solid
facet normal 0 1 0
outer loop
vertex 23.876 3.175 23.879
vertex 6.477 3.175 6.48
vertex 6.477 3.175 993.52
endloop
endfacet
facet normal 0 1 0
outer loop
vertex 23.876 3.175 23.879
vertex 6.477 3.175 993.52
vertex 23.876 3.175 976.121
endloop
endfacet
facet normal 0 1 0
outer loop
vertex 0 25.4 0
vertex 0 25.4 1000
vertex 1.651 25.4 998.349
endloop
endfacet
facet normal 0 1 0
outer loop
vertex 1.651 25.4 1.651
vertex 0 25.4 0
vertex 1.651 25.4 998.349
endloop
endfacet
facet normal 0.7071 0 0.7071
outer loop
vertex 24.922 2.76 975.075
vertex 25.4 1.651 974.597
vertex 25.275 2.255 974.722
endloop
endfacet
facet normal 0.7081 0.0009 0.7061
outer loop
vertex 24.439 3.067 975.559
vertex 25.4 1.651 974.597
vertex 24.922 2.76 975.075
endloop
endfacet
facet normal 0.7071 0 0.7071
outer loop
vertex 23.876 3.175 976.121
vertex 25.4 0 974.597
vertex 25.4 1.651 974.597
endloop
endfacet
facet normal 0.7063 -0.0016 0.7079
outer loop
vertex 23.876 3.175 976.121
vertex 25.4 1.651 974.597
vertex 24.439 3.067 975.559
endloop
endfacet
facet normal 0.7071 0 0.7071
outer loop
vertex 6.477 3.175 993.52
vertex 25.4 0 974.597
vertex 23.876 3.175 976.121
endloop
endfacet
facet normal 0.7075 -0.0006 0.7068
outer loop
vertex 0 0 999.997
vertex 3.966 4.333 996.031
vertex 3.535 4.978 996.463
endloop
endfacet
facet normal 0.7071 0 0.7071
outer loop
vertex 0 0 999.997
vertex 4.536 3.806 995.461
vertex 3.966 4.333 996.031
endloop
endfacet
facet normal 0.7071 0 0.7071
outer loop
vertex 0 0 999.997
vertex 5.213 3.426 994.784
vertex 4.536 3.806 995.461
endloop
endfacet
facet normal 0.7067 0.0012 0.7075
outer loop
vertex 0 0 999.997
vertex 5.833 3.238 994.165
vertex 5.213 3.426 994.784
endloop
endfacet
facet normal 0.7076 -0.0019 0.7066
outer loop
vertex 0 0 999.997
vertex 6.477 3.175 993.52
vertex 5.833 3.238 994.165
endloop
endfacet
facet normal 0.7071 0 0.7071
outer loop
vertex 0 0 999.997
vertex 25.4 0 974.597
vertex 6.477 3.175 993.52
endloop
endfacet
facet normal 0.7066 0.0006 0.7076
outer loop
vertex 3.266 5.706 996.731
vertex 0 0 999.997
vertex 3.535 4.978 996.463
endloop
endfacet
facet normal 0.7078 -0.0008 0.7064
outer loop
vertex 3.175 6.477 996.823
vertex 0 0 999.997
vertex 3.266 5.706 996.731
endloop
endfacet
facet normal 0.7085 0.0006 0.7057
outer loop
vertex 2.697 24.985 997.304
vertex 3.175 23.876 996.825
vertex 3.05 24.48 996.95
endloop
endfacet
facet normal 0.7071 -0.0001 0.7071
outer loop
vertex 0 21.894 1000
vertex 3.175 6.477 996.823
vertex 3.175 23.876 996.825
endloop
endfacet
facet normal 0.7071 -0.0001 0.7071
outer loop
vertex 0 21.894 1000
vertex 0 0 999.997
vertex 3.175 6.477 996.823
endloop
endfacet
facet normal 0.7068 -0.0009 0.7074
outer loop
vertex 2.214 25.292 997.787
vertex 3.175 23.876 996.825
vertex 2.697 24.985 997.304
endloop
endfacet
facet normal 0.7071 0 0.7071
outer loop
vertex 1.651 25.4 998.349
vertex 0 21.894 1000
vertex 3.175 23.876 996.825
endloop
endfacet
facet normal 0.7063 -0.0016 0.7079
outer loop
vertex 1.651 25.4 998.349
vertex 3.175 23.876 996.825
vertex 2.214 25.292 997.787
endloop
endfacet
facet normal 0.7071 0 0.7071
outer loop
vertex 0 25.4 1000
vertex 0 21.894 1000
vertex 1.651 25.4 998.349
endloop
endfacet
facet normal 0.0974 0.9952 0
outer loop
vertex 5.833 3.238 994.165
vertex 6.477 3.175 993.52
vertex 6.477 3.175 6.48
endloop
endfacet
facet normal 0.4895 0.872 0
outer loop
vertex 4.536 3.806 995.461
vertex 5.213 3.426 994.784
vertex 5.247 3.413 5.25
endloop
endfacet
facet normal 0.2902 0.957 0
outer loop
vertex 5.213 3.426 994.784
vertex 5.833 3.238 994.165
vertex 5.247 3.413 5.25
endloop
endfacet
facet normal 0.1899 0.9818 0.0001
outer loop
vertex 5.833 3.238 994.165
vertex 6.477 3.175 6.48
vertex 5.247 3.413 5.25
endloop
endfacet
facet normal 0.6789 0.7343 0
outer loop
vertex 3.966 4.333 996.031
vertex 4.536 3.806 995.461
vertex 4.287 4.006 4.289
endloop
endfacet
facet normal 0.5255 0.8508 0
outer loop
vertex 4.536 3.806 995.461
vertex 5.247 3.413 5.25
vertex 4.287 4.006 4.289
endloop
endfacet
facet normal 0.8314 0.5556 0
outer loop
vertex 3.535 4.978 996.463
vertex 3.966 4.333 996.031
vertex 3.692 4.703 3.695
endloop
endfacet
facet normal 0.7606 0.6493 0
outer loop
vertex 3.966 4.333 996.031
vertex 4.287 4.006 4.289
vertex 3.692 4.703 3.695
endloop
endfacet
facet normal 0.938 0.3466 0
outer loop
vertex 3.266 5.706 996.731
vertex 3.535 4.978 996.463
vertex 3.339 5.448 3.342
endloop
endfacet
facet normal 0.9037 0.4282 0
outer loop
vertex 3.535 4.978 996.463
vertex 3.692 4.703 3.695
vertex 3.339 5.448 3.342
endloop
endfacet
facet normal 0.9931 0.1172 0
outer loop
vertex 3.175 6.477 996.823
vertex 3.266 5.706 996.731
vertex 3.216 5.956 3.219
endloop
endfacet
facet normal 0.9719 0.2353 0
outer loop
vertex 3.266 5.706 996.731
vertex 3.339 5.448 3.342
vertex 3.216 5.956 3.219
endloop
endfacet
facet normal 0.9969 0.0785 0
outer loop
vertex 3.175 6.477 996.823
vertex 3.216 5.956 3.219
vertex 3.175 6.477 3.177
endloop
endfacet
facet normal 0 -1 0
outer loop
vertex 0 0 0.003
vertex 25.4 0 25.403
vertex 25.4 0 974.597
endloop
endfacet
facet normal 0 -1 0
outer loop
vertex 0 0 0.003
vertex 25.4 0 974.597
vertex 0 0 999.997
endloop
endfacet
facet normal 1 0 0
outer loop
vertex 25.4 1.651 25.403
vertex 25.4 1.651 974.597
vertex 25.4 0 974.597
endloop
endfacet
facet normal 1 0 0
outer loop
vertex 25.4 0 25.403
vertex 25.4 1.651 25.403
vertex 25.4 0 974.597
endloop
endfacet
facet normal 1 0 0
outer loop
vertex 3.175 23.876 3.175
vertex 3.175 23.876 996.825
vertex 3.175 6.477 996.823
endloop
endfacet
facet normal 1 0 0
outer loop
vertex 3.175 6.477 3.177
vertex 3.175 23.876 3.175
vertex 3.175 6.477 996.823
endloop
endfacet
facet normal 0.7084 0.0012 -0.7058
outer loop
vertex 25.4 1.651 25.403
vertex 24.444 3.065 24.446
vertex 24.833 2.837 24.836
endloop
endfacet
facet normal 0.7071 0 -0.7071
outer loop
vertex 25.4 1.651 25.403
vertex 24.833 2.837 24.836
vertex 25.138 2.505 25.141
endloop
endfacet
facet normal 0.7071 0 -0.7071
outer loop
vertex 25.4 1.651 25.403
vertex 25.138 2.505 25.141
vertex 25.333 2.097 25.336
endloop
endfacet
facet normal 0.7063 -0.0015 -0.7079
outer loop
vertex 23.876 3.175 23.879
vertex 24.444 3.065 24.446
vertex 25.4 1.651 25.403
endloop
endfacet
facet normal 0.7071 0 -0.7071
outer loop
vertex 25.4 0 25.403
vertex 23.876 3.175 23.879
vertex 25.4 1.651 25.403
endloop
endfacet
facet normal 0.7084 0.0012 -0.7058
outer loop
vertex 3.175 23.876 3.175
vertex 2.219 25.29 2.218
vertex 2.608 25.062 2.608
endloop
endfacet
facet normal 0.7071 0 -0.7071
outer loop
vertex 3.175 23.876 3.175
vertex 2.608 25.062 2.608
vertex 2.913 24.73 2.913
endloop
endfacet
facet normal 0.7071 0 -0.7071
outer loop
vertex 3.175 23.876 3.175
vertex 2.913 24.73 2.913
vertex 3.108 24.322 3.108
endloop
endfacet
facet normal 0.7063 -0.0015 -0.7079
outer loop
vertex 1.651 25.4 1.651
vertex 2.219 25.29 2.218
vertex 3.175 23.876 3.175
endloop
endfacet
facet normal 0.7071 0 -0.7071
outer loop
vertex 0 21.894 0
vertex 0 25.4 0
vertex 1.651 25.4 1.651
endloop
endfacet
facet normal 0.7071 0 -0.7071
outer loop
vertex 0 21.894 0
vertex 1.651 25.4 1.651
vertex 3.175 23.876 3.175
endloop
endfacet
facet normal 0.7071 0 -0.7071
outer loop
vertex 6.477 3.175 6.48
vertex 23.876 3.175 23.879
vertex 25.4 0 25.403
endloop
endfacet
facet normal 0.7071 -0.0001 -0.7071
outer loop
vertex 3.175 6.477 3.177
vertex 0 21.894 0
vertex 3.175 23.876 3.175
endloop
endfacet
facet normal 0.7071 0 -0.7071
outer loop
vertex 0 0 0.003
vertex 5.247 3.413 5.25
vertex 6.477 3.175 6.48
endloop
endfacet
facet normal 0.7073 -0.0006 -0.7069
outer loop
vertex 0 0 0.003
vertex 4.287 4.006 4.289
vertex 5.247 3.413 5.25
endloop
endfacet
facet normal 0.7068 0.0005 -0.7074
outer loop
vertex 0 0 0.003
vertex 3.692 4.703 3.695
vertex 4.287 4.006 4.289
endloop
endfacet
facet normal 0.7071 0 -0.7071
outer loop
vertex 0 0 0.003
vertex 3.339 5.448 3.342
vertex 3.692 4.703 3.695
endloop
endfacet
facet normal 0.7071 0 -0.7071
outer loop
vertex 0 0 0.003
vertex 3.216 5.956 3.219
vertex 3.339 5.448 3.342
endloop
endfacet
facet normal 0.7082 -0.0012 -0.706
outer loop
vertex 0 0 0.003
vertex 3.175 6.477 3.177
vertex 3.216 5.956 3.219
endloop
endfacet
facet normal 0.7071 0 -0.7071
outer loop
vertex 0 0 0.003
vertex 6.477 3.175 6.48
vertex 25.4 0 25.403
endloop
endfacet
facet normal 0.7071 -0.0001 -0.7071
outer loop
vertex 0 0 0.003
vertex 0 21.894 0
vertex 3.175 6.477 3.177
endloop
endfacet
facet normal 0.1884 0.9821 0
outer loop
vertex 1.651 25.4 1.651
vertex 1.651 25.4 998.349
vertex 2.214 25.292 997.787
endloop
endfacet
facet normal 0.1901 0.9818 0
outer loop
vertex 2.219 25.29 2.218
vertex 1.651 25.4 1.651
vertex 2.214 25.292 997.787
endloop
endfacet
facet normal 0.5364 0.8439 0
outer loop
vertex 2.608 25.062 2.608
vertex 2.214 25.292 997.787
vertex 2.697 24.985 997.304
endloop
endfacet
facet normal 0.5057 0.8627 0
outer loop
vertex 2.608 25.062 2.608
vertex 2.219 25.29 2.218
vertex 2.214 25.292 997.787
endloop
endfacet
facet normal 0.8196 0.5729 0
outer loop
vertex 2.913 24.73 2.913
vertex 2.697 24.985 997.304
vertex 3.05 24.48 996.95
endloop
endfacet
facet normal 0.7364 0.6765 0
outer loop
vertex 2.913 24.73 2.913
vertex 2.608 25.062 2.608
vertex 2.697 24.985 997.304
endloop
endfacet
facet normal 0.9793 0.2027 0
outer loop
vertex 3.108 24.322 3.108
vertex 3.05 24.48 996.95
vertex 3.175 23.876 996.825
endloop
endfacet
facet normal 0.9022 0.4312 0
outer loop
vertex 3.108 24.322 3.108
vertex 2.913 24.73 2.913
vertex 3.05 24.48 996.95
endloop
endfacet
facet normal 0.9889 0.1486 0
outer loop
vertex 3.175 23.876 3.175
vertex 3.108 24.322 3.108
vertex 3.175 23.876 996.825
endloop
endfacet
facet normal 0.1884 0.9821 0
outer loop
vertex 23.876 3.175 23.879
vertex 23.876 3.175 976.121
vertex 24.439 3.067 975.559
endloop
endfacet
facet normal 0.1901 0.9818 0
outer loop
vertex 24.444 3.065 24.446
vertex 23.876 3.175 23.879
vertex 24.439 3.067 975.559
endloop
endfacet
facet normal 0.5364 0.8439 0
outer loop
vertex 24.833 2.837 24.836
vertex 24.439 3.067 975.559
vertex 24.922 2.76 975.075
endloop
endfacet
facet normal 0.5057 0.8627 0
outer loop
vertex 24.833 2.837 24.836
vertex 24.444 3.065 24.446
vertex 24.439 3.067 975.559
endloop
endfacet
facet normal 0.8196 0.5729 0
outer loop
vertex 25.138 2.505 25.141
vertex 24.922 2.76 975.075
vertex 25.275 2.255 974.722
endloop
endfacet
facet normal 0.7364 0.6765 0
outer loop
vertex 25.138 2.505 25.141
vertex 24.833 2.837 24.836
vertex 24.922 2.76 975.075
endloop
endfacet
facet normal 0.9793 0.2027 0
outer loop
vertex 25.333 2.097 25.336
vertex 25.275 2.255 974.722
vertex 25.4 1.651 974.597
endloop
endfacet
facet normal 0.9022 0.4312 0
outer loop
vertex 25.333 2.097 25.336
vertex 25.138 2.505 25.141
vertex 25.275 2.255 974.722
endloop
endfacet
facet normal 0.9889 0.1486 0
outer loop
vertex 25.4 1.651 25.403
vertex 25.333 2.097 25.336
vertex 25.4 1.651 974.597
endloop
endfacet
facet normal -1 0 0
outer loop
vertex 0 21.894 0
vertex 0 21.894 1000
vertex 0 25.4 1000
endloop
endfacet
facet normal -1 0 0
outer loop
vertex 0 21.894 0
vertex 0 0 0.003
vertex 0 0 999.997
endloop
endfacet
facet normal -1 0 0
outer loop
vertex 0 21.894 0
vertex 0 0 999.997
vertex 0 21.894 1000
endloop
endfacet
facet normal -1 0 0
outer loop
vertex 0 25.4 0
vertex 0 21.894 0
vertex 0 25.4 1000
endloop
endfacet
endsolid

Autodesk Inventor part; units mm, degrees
ref_plane "Start Plane" through (0, 0, 0) normal (0, 0, 1) x (1, 0, 0)
ref_plane "End Plane" through (0, 0, 1000) normal (0, 0, 1) x (1, 0, 0)
sketch "Sketch" plane through (0, 0, 0) normal (0, 0, 1) x (1, 0, 0)
  line L0 (25.4, 0) -> (0, 0)
  line L1 (0, 0) -> (0, 25.4)
  line L2 (0, 25.4) -> (1.651, 25.4)
  line L3 (3.175, 23.876) -> (3.175, 6.477)
  line L4 (6.477, 3.175) -> (23.876, 3.175)
  line L5 (25.4, 1.651) -> (25.4, 0)
  line L6 (0, -11.0414) -> (0, 31.5385) construction
  line L7 (-11.0414, 0) -> (31.5385, 0) construction
  arc A0 (3.175, 6.477) -> (6.477, 3.175) centre (6.477, 6.477) ccw
  arc A1 (3.175, 23.876) -> (1.651, 25.4) centre (1.651, 23.876) ccw
  arc A2 (25.4, 1.651) -> (23.876, 3.175) centre (23.876, 1.651) ccw
  line L8 (0, 40.0545) -> (0, -19.5574) construction
  line L9 (-19.5574, 0) -> (40.0545, 0) construction
  point P0 (3.175, 25.4)
  point P1 (3.175, 3.175)
  point P2 (25.4, 3.175)
  dimension "d0" = 25.4
  dimension "d1" = 25.4
  dimension "d2" = 3.175
  dimension "d3" = 3.175
  dimension "d10" = 0
  dimension "d11" = 0
  dimension "d14" = 3.302
  dimension "d15" = 1.524
extrude "Body" add sketch "Sketch" along normal up to surface (1000 mm away) from surface at 0
sketch "Sketch3" plane through (0, 0, 0) normal (0, 0, 1) x (1, 0, 0)
  line L0 (0, 0) -> (10, 0)
ref_plane "Work Plane3" through (0, 0, 0) normal (0, -1, 0) x (1, 0, 0)
ref_plane "Work Plane30" through (-0.0013, 12.7013, 0) normal (0.7071, -0.0001, -0.7071) x (-0.7071, 0.0002, -0.7071)
split "Split3" plane through (-0.0013, 12.7013, 0) removes the side toward (0.7071, -0.0001, -0.7071)
ref_plane "Work Plane31" through (-0.0013, 12.7013, 1000) normal (0.7071, -0.0001, 0.7071) x (0.7071, 0, -0.7071)
split "Split4" plane through (-0.0013, 12.7013, 1000) removes the side toward (0.7071, -0.0001, 0.7071)
sketch "Sketch13" plane through (6.477, 3.175, 993.5214) normal (0, 1, 0) x (1, 0, 0)
  circle A0 centre (9.7828, 273.923) radius 1.65 projected
  circle A1 centre (9.7828, 466.623) radius 1.65 projected
  circle A2 centre (9.7828, 519.423) radius 1.65 projected
  circle A3 centre (9.7828, 712.123) radius 1.65 projected
  circle A4 centre (9.7828, 764.923) radius 1.65 projected
  circle A5 centre (9.7828, 957.623) radius 1.65 projected
  ellipse E0 centre (-0.4433, 28.423) end of major axis (-0.4433, 26.773) minor radius 1.6494 projected
  ellipse E1 centre (-0.2869, 221.123) end of major axis (-0.2869, 219.473) minor radius 1.6494 projected
  point P0 (-6.477, 993.5214)
sketch "Sketch14" plane through (3.175, 6.477, 996.8234) normal (1, 0, 0) x (0, 0, -1)
  circle A0 centre (277.225, 10.0627) radius 1.65 projected
  circle A1 centre (469.925, 10.0627) radius 1.65 projected
  circle A2 centre (522.725, 10.0627) radius 1.65 projected
  circle A3 centre (715.425, 10.0627) radius 1.65 projected
  circle A4 centre (768.225, 10.0627) radius 1.65 projected
  circle A5 centre (960.925, 10.0627) radius 1.65 projected
  ellipse E0 centre (31.725, 9.675) end of major axis (30.075, 9.675) minor radius 1.6494 projected
  ellipse E1 centre (224.425, 9.675) end of major axis (226.075, 9.675) minor radius 1.6494 projected
  point P0 (996.8234, -6.477)
sketch "Sketch4" plane through (0, 0, 0) normal (0, -1, 0) x (1, 0, 0)
  line L0 (-3.582, 0) -> (21.4918, 0) projected
  line L1 (-3.582, 1000) -> (21.4918, 1000) projected
  dimension "d17" = 1000
equation "\"d0\" = G_H"
equation "\"d1\" = G_H"
equation "\"d2\" = G_T"
equation "\"d3\" = G_T"
equation "\"d14\" = G_IR"
equation "\"d15\" = G_ER"
equation "\"d4\" = G_L"
equation "\"G_H\" = 25.4"
equation "\"G_T\" = 3.175"
equation "\"G_ER\" = 1.524"
equation "\"G_IR\" = 3.302"
equation "\"G_L\" = 1000"
equation "\"ex\" = 0"
equation "\"G_OFFSET_START\" = 0"
equation "\"G_OFFSET_END\" = 0"
properties part number "AISC - L 1 x 1 x 1/8 - 39.37" material "Steel, Mild"
